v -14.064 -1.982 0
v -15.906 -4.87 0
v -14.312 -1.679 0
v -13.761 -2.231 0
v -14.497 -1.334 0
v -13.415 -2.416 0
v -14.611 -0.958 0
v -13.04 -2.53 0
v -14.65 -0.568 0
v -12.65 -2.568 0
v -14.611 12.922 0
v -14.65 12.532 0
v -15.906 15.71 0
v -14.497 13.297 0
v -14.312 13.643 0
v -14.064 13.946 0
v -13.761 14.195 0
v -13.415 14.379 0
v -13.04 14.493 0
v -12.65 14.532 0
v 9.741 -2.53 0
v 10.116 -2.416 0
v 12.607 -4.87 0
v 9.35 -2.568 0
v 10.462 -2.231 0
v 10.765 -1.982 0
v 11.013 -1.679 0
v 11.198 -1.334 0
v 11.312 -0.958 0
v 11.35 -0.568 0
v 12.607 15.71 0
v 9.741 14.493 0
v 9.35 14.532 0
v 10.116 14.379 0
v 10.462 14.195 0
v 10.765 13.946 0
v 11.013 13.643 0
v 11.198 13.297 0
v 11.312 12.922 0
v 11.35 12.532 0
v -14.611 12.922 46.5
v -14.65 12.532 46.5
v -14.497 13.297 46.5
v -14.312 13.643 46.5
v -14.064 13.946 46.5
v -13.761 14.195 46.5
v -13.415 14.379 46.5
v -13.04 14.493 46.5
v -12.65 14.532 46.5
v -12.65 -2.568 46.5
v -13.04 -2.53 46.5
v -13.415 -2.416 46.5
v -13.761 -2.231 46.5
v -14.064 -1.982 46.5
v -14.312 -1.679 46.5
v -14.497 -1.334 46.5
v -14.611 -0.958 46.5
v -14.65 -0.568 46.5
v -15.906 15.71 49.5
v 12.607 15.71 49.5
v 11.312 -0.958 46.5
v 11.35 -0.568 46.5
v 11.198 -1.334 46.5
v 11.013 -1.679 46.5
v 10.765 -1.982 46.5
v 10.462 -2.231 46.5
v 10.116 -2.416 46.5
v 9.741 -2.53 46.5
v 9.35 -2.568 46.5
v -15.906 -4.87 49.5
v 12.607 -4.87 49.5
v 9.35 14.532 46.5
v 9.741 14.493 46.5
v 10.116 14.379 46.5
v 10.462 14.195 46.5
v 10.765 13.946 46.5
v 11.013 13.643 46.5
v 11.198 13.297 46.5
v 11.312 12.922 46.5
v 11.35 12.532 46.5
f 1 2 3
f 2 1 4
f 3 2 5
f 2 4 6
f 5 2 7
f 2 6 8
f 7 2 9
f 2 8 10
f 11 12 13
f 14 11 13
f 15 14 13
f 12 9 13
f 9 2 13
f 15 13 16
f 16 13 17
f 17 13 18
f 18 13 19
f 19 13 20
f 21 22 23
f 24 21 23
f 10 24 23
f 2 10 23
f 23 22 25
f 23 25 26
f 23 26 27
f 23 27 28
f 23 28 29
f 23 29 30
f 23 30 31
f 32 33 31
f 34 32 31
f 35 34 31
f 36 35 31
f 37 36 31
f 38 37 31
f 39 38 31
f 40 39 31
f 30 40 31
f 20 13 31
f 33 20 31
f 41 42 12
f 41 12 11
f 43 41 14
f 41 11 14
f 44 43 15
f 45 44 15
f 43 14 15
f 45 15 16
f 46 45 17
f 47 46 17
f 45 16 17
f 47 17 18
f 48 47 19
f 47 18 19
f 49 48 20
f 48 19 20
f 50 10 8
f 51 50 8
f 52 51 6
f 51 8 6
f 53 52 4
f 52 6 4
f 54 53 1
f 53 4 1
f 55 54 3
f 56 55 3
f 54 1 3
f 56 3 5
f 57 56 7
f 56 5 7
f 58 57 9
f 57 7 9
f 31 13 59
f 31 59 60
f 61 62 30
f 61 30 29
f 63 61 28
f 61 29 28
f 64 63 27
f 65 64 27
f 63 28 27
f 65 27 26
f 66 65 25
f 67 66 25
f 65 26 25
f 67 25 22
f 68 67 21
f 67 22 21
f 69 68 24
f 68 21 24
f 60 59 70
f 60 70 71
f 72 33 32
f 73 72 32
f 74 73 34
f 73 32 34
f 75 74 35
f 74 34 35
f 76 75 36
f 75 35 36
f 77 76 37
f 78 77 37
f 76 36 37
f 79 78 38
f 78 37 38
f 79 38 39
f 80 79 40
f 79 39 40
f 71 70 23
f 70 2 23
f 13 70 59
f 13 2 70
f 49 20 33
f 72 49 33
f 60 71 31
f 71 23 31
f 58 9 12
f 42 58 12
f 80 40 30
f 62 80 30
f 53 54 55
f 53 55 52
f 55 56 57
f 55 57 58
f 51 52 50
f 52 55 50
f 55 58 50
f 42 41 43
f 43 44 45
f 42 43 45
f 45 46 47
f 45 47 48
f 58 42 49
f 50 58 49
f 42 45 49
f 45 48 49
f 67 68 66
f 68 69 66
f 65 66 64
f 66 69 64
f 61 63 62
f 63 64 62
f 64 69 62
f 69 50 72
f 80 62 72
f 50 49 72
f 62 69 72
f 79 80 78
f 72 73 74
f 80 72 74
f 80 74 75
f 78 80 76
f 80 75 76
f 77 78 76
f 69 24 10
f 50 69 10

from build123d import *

# Parameters (mm, degrees)
SKETCH2_W           = 28.513595166
SKETCH2_H           = 20.580060423
BOSS_EXTRUDE1_DEPTH = 46.5
SKETCH3_W           = 28.513595166
SKETCH3_H           = 20.580060423
BOSS_EXTRUDE2_DEPTH = 3


with BuildPart() as part:
    # Sketch2 → Boss-Extrude1 (new body)
    with BuildSketch(Plane.XY):
        with Locations((-1.649546828, 5.419939578)):
            Rectangle(SKETCH2_W, SKETCH2_H)
        with BuildLine():
            Line((-12.649546828, 14.531722054), (9.350453172, 14.531722054))
            ThreePointArc((9.350453172, 14.531722054), (10.764666735, 13.945935617), (11.350453172, 12.531722054))
            Line((11.350453172, 12.531722054), (11.350453172, -0.568277946))
            ThreePointArc((11.350453172, -0.568277946), (10.764666735, -1.982491508), (9.350453172, -2.568277946))
            Line((9.350453172, -2.568277946), (-12.649546828, -2.568277946))
            ThreePointArc((-12.649546828, -2.568277946), (-14.06376039, -1.982491508), (-14.649546828, -0.568277946))
            Line((-14.649546828, -0.568277946), (-14.649546828, 12.531722054))
            ThreePointArc((-14.649546828, 12.531722054), (-14.06376039, 13.945935617), (-12.649546828, 14.531722054))
        make_face(mode=Mode.SUBTRACT)
    extrude(amount=BOSS_EXTRUDE1_DEPTH)

    # Sketch3 → Boss-Extrude2 (add)
    with BuildSketch(Plane.XY.offset(46.5)):
        with Locations((-1.649546828, 5.419939578)):
            Rectangle(SKETCH3_W, SKETCH3_H)
    extrude(amount=BOSS_EXTRUDE2_DEPTH)


solid = part.part
